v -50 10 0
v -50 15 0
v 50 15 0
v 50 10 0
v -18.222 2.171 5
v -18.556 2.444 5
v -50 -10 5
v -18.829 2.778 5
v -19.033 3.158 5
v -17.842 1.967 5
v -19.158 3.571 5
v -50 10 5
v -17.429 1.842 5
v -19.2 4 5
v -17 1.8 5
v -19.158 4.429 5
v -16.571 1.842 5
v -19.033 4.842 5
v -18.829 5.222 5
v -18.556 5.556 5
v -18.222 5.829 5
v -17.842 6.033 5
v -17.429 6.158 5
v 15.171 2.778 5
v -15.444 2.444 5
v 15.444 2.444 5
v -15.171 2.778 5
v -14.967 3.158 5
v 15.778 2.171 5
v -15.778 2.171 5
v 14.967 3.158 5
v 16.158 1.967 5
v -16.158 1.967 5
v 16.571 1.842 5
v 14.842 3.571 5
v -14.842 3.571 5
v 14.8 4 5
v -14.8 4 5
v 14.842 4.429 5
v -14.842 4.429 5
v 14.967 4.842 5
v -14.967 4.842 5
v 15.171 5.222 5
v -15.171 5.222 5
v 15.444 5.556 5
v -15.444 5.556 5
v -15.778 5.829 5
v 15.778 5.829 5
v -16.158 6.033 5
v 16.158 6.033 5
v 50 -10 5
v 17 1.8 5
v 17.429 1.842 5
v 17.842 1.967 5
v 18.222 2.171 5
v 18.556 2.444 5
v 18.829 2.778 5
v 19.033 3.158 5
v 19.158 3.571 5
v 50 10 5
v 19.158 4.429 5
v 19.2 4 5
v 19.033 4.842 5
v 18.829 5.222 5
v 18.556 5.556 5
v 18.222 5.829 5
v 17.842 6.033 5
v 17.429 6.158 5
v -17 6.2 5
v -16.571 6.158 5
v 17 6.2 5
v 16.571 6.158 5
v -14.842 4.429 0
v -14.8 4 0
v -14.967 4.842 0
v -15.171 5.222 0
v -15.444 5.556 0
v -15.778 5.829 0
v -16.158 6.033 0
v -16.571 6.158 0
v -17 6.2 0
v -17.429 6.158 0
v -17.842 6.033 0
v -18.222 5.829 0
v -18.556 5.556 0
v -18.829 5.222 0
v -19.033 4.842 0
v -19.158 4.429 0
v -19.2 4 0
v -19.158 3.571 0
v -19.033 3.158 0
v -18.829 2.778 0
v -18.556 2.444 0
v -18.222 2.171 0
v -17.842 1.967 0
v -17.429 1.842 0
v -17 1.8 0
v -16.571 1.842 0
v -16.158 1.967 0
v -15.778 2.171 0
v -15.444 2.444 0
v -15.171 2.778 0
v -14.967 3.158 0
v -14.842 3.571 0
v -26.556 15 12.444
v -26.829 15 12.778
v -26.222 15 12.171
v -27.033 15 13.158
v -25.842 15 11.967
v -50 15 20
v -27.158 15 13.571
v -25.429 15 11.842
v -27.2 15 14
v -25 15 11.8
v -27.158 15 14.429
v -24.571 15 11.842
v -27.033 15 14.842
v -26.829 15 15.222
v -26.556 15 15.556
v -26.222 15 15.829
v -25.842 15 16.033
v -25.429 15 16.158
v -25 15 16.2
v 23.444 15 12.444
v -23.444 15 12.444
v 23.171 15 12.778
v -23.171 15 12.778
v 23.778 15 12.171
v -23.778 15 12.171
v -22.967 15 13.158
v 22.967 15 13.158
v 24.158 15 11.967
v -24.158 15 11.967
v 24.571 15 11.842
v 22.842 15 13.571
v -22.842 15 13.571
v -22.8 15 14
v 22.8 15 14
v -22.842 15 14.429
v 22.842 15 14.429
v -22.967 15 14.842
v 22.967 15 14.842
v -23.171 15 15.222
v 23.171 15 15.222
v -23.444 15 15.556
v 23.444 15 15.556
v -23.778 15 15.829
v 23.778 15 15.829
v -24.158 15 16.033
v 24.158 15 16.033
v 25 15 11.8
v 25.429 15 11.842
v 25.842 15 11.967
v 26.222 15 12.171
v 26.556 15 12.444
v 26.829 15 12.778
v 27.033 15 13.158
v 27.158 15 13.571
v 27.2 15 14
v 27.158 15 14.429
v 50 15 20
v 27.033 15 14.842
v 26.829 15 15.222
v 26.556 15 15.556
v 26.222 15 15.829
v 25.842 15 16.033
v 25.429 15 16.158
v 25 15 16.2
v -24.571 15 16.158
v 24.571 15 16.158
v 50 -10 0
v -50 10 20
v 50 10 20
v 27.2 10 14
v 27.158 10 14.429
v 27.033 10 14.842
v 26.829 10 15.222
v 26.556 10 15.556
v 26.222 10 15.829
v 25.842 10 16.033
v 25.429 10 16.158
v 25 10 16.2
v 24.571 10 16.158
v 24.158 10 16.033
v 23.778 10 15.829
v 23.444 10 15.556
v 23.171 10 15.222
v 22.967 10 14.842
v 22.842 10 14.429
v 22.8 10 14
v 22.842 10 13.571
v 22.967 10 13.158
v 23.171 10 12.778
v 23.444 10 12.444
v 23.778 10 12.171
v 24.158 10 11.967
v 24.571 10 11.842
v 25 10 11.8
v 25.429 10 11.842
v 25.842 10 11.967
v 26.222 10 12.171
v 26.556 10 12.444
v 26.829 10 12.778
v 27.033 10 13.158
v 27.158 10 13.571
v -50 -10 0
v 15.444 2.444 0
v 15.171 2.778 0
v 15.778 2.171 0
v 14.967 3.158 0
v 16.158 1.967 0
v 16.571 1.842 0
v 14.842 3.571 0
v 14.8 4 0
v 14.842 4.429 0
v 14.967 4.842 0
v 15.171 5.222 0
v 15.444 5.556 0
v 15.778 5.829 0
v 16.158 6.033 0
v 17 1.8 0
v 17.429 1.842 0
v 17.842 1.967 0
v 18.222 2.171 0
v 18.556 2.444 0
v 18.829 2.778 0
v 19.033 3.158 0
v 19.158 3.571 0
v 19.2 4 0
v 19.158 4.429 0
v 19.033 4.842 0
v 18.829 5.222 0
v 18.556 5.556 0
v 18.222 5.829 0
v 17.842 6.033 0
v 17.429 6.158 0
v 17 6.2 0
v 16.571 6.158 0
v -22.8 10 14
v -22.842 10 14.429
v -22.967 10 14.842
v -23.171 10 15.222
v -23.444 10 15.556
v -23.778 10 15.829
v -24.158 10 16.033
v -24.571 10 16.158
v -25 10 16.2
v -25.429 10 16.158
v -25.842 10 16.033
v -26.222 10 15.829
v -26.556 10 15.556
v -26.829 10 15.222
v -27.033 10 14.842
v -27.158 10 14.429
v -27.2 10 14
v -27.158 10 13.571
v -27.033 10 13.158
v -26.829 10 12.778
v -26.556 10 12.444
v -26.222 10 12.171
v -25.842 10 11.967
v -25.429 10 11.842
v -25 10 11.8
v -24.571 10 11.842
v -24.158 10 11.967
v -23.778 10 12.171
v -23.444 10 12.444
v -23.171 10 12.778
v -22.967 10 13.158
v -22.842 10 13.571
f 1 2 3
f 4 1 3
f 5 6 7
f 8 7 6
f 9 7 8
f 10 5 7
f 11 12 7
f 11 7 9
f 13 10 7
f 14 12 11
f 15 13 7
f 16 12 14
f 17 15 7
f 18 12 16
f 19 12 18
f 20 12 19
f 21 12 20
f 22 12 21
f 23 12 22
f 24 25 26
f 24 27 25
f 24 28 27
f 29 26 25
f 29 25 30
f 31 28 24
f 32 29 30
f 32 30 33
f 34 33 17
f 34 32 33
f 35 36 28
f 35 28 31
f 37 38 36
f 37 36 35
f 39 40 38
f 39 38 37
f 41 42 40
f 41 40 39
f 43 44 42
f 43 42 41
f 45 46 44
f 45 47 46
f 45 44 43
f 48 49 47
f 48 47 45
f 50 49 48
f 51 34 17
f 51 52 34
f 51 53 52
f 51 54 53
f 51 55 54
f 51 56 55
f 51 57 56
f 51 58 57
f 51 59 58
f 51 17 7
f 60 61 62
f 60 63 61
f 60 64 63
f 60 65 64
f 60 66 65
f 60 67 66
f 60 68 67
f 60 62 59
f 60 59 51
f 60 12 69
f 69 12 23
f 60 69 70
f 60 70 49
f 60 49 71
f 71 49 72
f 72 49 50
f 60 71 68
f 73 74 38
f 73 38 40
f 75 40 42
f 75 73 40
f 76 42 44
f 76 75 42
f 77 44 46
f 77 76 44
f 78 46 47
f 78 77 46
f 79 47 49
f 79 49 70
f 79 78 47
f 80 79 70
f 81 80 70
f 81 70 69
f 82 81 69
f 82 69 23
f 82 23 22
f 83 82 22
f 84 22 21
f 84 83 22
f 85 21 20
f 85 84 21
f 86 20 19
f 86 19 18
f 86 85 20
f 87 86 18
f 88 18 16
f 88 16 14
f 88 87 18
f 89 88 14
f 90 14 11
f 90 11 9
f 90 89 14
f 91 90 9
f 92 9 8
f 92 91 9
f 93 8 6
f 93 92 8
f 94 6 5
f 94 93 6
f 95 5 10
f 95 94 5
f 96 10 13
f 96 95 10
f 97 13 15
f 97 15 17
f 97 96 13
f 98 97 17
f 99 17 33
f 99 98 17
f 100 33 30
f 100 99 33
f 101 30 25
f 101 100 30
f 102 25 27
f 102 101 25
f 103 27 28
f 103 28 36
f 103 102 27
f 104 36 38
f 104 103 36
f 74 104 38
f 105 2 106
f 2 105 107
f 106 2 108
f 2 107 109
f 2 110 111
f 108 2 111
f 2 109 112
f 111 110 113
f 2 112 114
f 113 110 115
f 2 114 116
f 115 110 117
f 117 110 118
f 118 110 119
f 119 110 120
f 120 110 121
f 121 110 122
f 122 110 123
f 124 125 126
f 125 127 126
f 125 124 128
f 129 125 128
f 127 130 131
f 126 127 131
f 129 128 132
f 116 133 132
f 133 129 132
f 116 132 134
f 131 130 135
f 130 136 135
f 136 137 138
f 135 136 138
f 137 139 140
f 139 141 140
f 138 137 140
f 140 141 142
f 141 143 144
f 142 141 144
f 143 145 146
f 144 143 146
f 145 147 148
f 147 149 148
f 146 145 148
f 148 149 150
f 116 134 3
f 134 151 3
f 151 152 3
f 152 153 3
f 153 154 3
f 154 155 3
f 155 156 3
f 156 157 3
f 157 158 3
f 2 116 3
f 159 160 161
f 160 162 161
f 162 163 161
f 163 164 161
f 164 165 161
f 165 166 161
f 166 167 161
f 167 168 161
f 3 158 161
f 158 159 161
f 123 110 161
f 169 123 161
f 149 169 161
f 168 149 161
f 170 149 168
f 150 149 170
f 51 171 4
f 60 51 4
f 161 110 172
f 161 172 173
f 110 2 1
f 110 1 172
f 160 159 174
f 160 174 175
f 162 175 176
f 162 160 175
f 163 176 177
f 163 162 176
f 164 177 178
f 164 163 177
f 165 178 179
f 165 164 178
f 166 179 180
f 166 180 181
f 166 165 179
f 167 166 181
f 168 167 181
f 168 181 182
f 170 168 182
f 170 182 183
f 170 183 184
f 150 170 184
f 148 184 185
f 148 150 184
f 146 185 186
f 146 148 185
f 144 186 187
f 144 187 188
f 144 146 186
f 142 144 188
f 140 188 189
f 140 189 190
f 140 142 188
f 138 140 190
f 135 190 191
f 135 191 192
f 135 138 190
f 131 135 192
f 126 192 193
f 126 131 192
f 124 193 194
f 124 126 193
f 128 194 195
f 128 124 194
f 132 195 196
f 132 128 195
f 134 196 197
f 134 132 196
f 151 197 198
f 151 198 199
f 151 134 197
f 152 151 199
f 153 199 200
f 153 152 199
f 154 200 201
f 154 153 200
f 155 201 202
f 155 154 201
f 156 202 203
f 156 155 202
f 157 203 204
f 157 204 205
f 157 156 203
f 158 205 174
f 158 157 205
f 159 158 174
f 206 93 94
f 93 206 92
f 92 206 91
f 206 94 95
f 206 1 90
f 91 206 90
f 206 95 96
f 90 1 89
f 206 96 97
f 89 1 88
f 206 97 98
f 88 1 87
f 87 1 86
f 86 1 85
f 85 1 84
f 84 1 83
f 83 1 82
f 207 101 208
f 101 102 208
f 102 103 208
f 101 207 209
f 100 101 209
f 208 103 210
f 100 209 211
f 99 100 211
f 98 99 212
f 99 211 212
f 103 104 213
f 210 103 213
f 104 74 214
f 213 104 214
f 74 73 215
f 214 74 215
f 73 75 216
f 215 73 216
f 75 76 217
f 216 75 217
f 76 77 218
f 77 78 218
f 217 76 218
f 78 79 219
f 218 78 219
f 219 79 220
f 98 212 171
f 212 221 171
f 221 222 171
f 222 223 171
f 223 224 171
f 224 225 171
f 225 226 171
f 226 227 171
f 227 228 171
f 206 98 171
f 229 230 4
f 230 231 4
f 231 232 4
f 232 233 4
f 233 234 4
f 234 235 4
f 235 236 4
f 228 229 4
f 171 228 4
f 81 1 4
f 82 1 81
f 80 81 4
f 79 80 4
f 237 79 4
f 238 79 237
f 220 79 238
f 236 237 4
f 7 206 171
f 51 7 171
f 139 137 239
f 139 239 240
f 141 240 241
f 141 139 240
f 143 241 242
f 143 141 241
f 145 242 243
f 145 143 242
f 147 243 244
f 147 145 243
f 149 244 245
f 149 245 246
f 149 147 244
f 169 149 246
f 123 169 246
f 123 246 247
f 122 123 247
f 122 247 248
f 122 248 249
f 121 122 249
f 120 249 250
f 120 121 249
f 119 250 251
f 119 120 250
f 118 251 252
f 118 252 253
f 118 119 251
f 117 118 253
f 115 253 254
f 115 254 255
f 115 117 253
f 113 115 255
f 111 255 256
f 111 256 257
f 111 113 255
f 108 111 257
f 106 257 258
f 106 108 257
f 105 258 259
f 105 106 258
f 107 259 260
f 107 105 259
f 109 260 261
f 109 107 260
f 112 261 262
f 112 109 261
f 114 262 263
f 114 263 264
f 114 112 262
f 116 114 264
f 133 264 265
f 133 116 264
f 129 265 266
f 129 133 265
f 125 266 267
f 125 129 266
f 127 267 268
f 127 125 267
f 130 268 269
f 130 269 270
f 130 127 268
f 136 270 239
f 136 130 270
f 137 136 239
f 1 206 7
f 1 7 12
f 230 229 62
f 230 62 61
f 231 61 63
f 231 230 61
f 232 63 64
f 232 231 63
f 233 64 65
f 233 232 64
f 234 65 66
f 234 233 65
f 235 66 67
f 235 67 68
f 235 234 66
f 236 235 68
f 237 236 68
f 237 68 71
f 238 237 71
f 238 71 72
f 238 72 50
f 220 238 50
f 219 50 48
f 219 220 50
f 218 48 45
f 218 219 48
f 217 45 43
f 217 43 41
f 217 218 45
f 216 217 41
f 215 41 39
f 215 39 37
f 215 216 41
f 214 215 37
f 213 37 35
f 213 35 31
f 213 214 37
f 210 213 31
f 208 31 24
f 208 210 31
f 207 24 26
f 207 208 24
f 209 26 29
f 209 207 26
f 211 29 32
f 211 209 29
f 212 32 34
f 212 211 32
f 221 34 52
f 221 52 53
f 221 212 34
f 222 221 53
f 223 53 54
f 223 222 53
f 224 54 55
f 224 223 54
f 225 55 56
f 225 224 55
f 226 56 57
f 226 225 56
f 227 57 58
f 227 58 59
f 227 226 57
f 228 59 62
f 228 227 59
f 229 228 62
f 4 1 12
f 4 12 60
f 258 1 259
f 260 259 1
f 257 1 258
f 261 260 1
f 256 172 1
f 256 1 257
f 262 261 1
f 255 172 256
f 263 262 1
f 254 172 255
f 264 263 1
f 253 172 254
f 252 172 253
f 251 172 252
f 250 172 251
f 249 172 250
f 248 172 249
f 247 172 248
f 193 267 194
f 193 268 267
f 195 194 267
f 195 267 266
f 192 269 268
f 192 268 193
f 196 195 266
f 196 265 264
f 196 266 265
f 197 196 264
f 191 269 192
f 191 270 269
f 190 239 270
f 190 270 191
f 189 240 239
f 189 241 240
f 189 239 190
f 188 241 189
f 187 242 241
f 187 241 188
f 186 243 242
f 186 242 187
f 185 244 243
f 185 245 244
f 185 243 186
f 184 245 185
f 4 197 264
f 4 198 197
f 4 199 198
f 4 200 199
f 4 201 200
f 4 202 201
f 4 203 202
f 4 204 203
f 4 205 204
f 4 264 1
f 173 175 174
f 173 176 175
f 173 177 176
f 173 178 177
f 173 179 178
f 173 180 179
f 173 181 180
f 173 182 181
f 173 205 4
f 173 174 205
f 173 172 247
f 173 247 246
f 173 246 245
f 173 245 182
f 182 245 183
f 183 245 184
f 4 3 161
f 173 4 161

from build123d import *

# Parameters (mm, degrees)
SKETCH_W     = 100
SKETCH_H     = 20
SKETCH_R     = 2.2
PAD_DEPTH    = 5
SKETCH001_W  = 100
SKETCH001_H  = 20
SKETCH001_R  = 2.2
PAD001_DEPTH = 5


with BuildPart() as pad:
    # Sketch → Pad (new body)
    with BuildSketch(Plane.XY):
        Rectangle(SKETCH_W, SKETCH_H)
        with Locations((17, 4)):
            Circle(SKETCH_R, mode=Mode.SUBTRACT)
        with Locations((-17, 4)):
            Circle(SKETCH_R, mode=Mode.SUBTRACT)
    extrude(amount=PAD_DEPTH)


with BuildPart() as pad001:
    # Sketch001 → Pad001 (new body)
    with BuildSketch(Plane(origin=(0, 15, 10), x_dir=(1, 0, 0), z_dir=(0, -1, 0))):
        Rectangle(SKETCH001_W, SKETCH001_H)
        with Locations((25, 4)):
            Circle(SKETCH001_R, mode=Mode.SUBTRACT)
        with Locations((-25, 4)):
            Circle(SKETCH001_R, mode=Mode.SUBTRACT)
    extrude(amount=PAD001_DEPTH)


solid = Compound([pad.part, pad001.part])
